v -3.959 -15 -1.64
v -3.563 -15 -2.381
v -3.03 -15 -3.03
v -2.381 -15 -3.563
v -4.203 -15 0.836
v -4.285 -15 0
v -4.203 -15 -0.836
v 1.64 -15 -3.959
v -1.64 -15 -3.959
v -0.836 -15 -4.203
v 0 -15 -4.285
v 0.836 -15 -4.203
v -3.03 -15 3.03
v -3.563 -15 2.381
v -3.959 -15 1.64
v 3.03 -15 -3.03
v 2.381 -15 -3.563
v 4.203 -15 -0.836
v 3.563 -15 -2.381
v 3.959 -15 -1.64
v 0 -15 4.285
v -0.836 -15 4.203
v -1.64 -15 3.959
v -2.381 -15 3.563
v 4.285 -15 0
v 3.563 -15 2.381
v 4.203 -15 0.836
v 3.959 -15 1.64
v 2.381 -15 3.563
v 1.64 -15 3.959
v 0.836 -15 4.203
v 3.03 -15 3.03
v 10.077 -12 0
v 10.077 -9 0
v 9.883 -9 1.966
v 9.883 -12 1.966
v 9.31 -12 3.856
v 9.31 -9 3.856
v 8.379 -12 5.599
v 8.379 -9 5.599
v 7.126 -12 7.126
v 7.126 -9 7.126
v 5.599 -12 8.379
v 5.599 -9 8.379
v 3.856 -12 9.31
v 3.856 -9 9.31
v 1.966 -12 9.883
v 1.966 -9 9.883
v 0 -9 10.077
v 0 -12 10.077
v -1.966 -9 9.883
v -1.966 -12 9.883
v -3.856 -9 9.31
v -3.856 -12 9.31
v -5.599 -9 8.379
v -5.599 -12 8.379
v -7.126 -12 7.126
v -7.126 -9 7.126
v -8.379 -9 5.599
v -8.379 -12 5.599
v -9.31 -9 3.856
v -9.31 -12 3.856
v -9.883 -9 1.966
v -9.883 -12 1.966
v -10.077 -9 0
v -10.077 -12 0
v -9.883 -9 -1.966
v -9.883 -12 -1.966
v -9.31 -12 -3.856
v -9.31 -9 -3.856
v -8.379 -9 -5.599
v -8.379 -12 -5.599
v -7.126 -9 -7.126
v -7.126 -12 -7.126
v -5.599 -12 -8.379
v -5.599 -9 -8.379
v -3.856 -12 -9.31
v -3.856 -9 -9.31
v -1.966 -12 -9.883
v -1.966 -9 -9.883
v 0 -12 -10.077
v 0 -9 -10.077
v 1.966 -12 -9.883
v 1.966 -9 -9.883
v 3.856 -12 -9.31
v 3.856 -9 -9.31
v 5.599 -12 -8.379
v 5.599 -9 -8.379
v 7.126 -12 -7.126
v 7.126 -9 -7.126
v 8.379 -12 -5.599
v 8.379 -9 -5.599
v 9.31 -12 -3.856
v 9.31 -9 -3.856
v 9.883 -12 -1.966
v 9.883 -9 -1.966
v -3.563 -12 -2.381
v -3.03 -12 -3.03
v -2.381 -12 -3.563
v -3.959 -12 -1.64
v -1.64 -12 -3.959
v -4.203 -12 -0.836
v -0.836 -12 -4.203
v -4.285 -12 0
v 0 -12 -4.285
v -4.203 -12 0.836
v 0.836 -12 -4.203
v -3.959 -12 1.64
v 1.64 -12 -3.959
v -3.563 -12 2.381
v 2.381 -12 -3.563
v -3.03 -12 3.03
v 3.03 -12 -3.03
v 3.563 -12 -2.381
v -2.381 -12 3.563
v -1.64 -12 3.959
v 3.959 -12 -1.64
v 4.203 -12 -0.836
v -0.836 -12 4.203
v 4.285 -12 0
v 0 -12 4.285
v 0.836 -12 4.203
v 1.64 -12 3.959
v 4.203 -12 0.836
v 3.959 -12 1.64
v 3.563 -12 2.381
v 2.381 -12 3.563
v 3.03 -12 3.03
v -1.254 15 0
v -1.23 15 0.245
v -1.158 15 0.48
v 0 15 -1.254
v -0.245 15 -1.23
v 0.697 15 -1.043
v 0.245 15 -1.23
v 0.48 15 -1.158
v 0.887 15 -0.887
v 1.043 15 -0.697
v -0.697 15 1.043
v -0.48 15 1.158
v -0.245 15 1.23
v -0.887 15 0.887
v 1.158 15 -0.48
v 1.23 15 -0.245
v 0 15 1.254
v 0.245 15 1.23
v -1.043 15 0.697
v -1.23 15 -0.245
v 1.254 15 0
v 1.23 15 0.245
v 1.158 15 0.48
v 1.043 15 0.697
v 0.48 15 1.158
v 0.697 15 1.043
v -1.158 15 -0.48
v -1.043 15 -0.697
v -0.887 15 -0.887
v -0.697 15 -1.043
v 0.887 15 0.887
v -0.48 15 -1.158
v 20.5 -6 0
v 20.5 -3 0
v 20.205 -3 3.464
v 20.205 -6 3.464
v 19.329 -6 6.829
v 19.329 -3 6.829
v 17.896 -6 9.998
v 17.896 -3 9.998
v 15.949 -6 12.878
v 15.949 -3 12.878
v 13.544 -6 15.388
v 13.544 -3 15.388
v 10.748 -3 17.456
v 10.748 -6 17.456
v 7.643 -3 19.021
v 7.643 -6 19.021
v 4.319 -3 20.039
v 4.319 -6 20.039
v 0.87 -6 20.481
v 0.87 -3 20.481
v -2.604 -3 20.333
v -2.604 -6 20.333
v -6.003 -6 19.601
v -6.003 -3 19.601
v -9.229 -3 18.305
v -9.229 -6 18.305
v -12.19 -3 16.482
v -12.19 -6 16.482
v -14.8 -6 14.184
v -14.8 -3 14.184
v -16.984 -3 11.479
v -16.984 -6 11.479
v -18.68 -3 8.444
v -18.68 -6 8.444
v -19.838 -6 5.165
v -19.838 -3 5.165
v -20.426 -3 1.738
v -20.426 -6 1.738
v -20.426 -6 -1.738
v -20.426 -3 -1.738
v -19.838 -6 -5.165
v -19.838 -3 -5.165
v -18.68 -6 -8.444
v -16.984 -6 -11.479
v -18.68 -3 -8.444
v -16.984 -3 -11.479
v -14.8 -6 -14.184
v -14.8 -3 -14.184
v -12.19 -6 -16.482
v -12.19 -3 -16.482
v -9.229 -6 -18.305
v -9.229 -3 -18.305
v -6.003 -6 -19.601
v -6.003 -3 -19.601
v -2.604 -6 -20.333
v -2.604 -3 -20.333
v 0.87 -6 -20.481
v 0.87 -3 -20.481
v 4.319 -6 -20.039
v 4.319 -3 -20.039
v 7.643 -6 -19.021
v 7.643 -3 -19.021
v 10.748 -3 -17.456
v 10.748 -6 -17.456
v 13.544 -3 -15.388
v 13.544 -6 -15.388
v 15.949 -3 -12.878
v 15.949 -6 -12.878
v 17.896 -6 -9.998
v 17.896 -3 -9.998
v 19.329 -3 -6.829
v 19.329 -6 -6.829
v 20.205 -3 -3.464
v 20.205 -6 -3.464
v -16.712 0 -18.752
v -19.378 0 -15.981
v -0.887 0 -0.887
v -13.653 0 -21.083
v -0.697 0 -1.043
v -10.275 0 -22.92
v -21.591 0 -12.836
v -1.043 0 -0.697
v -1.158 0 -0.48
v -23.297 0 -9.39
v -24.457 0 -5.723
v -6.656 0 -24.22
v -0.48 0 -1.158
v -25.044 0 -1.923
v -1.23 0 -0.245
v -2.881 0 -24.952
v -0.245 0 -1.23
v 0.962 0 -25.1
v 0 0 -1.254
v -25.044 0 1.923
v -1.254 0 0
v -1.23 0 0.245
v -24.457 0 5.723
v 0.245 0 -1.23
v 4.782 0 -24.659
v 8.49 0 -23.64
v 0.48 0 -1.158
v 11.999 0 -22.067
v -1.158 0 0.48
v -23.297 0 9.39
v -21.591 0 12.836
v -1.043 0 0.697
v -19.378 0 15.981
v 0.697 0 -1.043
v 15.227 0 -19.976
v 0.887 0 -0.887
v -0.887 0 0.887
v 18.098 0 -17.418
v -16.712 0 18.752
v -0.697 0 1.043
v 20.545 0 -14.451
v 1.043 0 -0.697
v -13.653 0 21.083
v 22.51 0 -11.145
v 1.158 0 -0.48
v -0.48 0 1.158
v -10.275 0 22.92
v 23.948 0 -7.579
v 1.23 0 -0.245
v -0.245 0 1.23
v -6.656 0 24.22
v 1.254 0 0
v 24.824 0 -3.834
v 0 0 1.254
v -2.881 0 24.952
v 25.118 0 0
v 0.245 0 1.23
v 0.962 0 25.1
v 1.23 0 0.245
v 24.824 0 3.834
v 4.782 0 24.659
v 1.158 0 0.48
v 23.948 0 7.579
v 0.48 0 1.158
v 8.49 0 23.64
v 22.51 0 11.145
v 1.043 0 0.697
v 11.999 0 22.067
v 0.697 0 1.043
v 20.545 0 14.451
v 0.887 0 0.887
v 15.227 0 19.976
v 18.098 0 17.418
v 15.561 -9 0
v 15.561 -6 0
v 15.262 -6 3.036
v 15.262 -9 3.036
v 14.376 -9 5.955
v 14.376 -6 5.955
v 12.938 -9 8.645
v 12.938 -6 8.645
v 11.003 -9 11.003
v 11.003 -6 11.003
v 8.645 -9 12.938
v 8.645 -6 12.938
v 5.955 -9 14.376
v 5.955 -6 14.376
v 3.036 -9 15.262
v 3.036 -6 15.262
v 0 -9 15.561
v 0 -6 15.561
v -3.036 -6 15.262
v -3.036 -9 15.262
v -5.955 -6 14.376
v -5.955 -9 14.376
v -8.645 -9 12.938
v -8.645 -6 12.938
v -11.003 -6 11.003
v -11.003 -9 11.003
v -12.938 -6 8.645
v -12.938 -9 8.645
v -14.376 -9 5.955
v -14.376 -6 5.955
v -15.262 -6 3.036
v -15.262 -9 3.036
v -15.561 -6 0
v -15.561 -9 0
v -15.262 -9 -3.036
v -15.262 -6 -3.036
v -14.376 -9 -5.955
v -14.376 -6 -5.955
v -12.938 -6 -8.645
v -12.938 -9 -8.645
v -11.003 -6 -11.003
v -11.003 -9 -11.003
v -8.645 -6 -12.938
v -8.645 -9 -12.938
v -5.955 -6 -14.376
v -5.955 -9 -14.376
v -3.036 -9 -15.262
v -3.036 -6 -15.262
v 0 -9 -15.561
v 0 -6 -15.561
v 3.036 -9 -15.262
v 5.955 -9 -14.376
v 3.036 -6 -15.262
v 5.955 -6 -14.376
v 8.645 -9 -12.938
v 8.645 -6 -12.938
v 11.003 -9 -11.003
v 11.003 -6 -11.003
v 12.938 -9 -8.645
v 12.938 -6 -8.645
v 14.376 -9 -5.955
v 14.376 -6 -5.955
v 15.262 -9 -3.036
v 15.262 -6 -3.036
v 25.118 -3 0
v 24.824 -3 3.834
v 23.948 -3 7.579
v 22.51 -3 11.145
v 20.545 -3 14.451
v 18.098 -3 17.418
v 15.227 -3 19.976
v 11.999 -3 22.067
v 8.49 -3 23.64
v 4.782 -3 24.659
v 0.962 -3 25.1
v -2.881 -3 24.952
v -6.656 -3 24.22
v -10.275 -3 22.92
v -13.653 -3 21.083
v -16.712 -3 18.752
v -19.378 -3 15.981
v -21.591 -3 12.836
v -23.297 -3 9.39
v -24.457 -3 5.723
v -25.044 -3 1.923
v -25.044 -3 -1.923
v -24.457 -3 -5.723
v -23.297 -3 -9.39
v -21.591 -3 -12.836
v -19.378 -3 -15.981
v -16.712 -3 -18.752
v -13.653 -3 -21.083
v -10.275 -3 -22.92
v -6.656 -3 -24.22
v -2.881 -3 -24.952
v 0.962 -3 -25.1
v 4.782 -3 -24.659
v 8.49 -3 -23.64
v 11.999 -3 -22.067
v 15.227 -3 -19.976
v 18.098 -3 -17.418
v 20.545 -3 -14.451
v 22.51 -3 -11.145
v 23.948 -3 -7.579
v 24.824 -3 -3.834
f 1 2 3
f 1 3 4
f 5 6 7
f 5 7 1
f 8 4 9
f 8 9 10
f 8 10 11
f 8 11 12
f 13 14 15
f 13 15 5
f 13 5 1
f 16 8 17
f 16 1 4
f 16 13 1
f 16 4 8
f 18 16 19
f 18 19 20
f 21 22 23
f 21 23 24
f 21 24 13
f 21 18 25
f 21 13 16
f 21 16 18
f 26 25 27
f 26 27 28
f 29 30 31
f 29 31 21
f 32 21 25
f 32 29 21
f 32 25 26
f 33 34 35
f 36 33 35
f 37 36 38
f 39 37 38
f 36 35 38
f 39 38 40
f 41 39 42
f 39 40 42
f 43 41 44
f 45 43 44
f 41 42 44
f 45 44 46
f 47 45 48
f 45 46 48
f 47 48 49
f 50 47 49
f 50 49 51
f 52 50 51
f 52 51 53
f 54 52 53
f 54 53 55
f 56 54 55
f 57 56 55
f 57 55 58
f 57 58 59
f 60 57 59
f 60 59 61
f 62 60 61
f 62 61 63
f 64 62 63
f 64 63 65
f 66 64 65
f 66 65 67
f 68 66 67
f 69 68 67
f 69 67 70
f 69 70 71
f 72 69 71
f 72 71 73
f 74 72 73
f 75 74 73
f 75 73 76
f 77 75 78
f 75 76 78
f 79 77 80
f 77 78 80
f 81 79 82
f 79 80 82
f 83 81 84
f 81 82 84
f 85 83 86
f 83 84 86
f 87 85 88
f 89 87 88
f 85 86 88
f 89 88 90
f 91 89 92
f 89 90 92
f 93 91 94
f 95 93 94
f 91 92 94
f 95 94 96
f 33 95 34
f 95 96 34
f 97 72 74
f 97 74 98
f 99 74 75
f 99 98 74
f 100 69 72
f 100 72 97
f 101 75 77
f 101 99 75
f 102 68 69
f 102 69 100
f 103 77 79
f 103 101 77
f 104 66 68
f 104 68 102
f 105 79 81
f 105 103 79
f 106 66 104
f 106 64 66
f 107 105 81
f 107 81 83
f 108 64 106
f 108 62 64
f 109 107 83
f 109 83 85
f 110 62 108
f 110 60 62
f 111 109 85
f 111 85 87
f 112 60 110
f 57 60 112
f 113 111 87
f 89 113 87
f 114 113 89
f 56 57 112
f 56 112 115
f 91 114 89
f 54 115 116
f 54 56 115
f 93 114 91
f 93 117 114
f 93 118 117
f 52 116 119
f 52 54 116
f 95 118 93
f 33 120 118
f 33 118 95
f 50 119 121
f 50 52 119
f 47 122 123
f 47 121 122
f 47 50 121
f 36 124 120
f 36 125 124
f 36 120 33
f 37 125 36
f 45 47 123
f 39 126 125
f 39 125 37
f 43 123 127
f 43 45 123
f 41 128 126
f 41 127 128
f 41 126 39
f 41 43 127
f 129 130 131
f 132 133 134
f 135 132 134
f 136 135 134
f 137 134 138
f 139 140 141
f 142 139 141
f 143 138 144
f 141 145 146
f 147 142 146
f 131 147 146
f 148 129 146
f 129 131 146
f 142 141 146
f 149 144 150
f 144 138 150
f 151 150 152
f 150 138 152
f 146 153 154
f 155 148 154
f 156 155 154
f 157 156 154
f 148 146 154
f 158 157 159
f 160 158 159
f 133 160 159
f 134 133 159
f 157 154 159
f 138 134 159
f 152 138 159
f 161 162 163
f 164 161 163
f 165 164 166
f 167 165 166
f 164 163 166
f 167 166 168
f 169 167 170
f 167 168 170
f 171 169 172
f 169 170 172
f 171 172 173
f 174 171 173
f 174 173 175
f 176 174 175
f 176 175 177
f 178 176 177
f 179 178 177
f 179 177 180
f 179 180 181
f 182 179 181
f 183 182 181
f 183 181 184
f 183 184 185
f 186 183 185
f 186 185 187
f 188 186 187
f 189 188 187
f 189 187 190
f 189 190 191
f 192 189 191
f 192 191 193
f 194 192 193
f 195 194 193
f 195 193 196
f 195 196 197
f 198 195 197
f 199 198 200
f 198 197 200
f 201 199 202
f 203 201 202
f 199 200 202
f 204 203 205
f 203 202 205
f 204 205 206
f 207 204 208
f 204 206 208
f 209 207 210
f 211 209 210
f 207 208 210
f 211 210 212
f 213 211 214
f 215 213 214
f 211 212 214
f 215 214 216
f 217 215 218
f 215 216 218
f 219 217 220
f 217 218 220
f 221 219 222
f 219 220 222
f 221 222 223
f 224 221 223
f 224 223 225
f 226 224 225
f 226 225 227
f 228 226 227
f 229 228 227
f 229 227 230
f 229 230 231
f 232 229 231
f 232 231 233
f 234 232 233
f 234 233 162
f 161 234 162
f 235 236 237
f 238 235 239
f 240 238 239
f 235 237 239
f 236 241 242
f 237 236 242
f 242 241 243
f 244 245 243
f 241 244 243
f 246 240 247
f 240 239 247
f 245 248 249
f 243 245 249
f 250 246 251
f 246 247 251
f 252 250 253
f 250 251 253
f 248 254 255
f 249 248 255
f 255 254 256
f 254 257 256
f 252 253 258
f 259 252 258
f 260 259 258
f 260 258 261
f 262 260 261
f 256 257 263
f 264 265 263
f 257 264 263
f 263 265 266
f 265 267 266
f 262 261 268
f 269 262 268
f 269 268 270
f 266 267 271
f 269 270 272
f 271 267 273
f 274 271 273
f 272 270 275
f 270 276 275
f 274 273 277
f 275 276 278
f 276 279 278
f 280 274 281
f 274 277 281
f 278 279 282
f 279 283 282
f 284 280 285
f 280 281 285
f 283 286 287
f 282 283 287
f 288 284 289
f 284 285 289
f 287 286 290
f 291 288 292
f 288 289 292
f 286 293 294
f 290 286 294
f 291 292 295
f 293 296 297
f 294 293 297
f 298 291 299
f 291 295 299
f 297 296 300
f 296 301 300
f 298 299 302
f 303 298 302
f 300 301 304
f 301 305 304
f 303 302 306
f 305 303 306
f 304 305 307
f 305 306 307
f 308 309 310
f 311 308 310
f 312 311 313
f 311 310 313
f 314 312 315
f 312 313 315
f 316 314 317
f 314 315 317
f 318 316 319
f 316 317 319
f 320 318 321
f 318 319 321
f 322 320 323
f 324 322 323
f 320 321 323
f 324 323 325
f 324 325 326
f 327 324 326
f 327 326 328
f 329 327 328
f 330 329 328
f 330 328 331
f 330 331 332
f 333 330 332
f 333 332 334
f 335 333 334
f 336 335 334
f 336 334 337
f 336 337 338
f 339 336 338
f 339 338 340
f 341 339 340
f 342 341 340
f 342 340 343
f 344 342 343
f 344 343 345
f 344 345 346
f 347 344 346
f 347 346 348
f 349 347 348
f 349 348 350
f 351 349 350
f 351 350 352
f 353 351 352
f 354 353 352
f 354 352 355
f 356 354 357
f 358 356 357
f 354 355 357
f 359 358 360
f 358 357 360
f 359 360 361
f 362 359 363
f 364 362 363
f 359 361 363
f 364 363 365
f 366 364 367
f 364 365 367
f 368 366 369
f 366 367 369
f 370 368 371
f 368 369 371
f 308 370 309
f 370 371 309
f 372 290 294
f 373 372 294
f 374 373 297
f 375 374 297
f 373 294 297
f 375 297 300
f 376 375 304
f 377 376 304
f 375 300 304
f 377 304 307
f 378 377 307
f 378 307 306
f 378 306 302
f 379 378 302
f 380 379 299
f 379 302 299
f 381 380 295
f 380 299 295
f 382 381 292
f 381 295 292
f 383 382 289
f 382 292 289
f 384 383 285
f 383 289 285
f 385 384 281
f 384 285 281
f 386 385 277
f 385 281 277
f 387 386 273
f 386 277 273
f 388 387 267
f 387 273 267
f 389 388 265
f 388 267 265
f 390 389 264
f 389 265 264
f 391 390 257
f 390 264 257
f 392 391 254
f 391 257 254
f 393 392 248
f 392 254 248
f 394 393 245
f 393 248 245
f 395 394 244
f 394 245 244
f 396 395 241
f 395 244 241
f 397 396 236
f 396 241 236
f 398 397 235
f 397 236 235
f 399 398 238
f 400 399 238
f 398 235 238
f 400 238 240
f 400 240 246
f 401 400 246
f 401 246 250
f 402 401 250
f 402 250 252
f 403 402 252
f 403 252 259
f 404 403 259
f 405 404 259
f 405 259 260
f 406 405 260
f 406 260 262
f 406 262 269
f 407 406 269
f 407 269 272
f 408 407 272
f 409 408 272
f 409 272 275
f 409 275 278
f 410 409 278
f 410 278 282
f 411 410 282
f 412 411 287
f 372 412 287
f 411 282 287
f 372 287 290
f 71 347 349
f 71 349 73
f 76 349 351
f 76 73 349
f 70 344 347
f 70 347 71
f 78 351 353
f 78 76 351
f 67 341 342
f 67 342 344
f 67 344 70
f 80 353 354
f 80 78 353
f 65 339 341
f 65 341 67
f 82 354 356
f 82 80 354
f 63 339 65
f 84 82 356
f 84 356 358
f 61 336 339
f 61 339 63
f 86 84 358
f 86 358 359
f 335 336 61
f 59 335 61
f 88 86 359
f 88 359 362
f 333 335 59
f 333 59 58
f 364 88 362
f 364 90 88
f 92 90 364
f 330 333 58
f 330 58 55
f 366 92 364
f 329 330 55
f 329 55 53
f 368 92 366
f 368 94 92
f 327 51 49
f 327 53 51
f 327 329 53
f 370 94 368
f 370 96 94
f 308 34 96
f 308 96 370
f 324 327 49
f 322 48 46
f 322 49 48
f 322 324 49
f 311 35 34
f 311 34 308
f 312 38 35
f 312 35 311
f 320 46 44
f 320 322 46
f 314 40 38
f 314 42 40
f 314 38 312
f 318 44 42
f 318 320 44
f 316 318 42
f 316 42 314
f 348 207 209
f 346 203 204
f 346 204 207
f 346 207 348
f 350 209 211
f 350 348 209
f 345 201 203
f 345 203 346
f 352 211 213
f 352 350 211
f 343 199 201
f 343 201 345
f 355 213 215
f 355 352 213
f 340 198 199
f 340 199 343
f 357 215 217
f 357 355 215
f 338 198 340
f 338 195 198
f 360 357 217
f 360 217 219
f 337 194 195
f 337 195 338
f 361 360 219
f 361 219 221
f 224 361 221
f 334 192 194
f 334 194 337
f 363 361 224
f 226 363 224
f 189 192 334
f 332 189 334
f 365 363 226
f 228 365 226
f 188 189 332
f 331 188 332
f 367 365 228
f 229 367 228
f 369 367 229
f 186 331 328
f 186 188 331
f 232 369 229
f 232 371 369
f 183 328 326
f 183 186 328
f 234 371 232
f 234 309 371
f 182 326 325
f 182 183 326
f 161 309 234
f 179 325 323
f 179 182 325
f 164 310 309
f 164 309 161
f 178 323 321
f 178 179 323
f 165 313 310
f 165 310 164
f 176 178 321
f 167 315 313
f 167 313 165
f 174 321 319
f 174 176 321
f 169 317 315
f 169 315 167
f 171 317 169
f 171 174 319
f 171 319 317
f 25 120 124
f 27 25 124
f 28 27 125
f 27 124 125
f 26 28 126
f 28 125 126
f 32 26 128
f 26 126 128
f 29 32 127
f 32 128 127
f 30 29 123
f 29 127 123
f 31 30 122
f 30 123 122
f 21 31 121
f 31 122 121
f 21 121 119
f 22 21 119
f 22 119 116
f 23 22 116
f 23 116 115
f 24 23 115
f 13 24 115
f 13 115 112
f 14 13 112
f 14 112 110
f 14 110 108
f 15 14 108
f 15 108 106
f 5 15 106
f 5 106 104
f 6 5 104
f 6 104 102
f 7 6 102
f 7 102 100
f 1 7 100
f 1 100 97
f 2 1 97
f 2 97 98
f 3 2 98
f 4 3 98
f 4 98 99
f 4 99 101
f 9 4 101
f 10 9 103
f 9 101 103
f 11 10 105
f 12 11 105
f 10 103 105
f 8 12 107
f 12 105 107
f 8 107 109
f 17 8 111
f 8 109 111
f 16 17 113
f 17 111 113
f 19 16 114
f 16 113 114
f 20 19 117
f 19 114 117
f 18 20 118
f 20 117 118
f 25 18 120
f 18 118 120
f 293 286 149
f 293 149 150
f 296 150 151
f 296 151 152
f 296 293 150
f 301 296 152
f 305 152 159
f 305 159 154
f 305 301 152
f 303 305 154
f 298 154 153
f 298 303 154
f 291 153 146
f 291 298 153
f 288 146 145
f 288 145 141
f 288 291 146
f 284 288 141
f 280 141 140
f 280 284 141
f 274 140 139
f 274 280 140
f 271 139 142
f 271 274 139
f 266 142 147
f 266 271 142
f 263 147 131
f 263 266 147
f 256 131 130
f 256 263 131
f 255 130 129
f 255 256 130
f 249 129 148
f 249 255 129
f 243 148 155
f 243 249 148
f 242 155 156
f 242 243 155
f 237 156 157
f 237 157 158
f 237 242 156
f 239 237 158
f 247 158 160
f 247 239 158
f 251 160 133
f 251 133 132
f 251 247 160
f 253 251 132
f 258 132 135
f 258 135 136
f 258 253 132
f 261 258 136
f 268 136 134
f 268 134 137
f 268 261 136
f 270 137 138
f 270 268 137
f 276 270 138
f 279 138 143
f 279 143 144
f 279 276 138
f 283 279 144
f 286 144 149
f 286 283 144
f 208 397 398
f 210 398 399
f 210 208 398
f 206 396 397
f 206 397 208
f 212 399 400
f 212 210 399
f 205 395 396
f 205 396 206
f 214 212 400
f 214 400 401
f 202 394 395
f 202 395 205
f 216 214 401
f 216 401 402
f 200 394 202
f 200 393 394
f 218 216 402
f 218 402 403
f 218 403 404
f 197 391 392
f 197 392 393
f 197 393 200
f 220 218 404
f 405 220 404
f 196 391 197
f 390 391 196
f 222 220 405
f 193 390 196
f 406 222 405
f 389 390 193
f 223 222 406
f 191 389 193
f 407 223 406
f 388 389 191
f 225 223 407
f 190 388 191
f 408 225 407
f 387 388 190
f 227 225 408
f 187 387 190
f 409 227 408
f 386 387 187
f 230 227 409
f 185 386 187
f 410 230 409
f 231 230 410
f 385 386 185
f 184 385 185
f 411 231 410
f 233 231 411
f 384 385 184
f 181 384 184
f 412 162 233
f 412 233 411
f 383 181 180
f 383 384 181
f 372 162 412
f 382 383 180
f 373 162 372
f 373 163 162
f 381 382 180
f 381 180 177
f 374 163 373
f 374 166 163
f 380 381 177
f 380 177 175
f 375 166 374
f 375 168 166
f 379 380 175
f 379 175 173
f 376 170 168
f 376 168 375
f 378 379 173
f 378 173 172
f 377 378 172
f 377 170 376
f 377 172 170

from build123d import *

# Parameters (mm, degrees)
F0_R     = 25.118171
F0_R_2   = 20.499511
F1_DEPTH = 3
F0_R_3   = 15.56051
F2_DEPTH = 6
F0_R_4   = 10.077098
F3_DEPTH = 9
F0_R_5   = 4.284834
F4_DEPTH = 12
F0_R_6   = 1.253912
F5_DEPTH = 15
F6_DEPTH = 15
F7_DEPTH = 15


with BuildPart() as f1:
    # F0 (on Front) → F1 (new body)
    with BuildSketch(Plane.XZ):
        Circle(F0_R)
        Circle(F0_R_2, mode=Mode.SUBTRACT)
    extrude(amount=F1_DEPTH)

    # F0 (on Front) → F2 (join)
    with BuildSketch(Plane.XZ):
        Circle(F0_R_2)
        Circle(F0_R_3, mode=Mode.SUBTRACT)
    extrude(amount=F2_DEPTH)

    # F0 (on Front) → F3 (join)
    with BuildSketch(Plane.XZ):
        Circle(F0_R_3)
        Circle(F0_R_4, mode=Mode.SUBTRACT)
    extrude(amount=F3_DEPTH)

    # F0 (on Front) → F4 (join)
    with BuildSketch(Plane.XZ):
        Circle(F0_R_4)
        Circle(F0_R_5, mode=Mode.SUBTRACT)
    extrude(amount=F4_DEPTH)

    # F0 (on Front) → F5 (join)
    with BuildSketch(Plane.XZ):
        Circle(F0_R_5)
        Circle(F0_R_6, mode=Mode.SUBTRACT)
    extrude(amount=F5_DEPTH)

    # F0 (on Front) → F6 (join)
    with BuildSketch(Plane.XZ):
        Circle(F0_R_6)
    extrude(amount=F6_DEPTH)

    # F0 (on Front) → F7 (join)
    with BuildSketch(Plane.XZ):
        Circle(F0_R_6)
    extrude(amount=-F7_DEPTH)


solid = f1.part
